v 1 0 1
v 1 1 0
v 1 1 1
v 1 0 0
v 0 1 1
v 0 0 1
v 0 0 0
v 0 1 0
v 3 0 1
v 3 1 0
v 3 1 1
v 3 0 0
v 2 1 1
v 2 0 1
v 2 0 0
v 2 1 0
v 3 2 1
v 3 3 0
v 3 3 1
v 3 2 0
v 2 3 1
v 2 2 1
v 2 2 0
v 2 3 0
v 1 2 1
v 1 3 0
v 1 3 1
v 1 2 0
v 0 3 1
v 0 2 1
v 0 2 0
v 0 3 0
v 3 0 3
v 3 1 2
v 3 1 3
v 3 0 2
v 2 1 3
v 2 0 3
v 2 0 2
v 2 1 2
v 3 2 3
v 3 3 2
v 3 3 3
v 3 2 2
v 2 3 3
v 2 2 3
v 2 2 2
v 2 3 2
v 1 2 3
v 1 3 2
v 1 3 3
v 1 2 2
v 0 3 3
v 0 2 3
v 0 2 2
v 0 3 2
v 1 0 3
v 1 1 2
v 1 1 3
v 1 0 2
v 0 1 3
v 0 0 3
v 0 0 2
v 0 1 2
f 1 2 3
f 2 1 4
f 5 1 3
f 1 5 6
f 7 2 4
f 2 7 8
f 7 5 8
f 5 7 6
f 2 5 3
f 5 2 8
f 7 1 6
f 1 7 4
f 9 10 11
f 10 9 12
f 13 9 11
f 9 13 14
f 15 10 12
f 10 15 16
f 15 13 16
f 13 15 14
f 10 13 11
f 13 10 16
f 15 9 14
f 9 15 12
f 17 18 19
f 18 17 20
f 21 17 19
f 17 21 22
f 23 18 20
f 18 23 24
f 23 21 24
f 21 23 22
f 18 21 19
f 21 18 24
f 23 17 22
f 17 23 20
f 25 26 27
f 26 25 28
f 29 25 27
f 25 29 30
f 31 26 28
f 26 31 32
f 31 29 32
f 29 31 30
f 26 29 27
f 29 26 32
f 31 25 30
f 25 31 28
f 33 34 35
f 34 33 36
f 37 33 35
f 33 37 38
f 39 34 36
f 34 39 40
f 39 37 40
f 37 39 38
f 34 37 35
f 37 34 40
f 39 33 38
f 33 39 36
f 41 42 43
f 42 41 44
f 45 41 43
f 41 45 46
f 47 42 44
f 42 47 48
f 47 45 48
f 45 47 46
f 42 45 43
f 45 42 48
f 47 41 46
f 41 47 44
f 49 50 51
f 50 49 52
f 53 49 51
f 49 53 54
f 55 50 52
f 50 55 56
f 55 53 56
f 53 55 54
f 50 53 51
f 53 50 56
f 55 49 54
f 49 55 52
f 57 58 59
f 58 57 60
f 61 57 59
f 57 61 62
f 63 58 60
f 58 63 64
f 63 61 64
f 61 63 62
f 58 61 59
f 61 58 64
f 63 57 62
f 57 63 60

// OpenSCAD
cube();
translate([2, 0, 0]) cube();
translate([2, 2, 0]) cube();
translate([0, 2, 0]) cube();
translate([2, 0, 2]) cube();
translate([2, 2, 2]) cube();
translate([0, 2, 2]) cube();
translate([0, 0, 2]) cube();
